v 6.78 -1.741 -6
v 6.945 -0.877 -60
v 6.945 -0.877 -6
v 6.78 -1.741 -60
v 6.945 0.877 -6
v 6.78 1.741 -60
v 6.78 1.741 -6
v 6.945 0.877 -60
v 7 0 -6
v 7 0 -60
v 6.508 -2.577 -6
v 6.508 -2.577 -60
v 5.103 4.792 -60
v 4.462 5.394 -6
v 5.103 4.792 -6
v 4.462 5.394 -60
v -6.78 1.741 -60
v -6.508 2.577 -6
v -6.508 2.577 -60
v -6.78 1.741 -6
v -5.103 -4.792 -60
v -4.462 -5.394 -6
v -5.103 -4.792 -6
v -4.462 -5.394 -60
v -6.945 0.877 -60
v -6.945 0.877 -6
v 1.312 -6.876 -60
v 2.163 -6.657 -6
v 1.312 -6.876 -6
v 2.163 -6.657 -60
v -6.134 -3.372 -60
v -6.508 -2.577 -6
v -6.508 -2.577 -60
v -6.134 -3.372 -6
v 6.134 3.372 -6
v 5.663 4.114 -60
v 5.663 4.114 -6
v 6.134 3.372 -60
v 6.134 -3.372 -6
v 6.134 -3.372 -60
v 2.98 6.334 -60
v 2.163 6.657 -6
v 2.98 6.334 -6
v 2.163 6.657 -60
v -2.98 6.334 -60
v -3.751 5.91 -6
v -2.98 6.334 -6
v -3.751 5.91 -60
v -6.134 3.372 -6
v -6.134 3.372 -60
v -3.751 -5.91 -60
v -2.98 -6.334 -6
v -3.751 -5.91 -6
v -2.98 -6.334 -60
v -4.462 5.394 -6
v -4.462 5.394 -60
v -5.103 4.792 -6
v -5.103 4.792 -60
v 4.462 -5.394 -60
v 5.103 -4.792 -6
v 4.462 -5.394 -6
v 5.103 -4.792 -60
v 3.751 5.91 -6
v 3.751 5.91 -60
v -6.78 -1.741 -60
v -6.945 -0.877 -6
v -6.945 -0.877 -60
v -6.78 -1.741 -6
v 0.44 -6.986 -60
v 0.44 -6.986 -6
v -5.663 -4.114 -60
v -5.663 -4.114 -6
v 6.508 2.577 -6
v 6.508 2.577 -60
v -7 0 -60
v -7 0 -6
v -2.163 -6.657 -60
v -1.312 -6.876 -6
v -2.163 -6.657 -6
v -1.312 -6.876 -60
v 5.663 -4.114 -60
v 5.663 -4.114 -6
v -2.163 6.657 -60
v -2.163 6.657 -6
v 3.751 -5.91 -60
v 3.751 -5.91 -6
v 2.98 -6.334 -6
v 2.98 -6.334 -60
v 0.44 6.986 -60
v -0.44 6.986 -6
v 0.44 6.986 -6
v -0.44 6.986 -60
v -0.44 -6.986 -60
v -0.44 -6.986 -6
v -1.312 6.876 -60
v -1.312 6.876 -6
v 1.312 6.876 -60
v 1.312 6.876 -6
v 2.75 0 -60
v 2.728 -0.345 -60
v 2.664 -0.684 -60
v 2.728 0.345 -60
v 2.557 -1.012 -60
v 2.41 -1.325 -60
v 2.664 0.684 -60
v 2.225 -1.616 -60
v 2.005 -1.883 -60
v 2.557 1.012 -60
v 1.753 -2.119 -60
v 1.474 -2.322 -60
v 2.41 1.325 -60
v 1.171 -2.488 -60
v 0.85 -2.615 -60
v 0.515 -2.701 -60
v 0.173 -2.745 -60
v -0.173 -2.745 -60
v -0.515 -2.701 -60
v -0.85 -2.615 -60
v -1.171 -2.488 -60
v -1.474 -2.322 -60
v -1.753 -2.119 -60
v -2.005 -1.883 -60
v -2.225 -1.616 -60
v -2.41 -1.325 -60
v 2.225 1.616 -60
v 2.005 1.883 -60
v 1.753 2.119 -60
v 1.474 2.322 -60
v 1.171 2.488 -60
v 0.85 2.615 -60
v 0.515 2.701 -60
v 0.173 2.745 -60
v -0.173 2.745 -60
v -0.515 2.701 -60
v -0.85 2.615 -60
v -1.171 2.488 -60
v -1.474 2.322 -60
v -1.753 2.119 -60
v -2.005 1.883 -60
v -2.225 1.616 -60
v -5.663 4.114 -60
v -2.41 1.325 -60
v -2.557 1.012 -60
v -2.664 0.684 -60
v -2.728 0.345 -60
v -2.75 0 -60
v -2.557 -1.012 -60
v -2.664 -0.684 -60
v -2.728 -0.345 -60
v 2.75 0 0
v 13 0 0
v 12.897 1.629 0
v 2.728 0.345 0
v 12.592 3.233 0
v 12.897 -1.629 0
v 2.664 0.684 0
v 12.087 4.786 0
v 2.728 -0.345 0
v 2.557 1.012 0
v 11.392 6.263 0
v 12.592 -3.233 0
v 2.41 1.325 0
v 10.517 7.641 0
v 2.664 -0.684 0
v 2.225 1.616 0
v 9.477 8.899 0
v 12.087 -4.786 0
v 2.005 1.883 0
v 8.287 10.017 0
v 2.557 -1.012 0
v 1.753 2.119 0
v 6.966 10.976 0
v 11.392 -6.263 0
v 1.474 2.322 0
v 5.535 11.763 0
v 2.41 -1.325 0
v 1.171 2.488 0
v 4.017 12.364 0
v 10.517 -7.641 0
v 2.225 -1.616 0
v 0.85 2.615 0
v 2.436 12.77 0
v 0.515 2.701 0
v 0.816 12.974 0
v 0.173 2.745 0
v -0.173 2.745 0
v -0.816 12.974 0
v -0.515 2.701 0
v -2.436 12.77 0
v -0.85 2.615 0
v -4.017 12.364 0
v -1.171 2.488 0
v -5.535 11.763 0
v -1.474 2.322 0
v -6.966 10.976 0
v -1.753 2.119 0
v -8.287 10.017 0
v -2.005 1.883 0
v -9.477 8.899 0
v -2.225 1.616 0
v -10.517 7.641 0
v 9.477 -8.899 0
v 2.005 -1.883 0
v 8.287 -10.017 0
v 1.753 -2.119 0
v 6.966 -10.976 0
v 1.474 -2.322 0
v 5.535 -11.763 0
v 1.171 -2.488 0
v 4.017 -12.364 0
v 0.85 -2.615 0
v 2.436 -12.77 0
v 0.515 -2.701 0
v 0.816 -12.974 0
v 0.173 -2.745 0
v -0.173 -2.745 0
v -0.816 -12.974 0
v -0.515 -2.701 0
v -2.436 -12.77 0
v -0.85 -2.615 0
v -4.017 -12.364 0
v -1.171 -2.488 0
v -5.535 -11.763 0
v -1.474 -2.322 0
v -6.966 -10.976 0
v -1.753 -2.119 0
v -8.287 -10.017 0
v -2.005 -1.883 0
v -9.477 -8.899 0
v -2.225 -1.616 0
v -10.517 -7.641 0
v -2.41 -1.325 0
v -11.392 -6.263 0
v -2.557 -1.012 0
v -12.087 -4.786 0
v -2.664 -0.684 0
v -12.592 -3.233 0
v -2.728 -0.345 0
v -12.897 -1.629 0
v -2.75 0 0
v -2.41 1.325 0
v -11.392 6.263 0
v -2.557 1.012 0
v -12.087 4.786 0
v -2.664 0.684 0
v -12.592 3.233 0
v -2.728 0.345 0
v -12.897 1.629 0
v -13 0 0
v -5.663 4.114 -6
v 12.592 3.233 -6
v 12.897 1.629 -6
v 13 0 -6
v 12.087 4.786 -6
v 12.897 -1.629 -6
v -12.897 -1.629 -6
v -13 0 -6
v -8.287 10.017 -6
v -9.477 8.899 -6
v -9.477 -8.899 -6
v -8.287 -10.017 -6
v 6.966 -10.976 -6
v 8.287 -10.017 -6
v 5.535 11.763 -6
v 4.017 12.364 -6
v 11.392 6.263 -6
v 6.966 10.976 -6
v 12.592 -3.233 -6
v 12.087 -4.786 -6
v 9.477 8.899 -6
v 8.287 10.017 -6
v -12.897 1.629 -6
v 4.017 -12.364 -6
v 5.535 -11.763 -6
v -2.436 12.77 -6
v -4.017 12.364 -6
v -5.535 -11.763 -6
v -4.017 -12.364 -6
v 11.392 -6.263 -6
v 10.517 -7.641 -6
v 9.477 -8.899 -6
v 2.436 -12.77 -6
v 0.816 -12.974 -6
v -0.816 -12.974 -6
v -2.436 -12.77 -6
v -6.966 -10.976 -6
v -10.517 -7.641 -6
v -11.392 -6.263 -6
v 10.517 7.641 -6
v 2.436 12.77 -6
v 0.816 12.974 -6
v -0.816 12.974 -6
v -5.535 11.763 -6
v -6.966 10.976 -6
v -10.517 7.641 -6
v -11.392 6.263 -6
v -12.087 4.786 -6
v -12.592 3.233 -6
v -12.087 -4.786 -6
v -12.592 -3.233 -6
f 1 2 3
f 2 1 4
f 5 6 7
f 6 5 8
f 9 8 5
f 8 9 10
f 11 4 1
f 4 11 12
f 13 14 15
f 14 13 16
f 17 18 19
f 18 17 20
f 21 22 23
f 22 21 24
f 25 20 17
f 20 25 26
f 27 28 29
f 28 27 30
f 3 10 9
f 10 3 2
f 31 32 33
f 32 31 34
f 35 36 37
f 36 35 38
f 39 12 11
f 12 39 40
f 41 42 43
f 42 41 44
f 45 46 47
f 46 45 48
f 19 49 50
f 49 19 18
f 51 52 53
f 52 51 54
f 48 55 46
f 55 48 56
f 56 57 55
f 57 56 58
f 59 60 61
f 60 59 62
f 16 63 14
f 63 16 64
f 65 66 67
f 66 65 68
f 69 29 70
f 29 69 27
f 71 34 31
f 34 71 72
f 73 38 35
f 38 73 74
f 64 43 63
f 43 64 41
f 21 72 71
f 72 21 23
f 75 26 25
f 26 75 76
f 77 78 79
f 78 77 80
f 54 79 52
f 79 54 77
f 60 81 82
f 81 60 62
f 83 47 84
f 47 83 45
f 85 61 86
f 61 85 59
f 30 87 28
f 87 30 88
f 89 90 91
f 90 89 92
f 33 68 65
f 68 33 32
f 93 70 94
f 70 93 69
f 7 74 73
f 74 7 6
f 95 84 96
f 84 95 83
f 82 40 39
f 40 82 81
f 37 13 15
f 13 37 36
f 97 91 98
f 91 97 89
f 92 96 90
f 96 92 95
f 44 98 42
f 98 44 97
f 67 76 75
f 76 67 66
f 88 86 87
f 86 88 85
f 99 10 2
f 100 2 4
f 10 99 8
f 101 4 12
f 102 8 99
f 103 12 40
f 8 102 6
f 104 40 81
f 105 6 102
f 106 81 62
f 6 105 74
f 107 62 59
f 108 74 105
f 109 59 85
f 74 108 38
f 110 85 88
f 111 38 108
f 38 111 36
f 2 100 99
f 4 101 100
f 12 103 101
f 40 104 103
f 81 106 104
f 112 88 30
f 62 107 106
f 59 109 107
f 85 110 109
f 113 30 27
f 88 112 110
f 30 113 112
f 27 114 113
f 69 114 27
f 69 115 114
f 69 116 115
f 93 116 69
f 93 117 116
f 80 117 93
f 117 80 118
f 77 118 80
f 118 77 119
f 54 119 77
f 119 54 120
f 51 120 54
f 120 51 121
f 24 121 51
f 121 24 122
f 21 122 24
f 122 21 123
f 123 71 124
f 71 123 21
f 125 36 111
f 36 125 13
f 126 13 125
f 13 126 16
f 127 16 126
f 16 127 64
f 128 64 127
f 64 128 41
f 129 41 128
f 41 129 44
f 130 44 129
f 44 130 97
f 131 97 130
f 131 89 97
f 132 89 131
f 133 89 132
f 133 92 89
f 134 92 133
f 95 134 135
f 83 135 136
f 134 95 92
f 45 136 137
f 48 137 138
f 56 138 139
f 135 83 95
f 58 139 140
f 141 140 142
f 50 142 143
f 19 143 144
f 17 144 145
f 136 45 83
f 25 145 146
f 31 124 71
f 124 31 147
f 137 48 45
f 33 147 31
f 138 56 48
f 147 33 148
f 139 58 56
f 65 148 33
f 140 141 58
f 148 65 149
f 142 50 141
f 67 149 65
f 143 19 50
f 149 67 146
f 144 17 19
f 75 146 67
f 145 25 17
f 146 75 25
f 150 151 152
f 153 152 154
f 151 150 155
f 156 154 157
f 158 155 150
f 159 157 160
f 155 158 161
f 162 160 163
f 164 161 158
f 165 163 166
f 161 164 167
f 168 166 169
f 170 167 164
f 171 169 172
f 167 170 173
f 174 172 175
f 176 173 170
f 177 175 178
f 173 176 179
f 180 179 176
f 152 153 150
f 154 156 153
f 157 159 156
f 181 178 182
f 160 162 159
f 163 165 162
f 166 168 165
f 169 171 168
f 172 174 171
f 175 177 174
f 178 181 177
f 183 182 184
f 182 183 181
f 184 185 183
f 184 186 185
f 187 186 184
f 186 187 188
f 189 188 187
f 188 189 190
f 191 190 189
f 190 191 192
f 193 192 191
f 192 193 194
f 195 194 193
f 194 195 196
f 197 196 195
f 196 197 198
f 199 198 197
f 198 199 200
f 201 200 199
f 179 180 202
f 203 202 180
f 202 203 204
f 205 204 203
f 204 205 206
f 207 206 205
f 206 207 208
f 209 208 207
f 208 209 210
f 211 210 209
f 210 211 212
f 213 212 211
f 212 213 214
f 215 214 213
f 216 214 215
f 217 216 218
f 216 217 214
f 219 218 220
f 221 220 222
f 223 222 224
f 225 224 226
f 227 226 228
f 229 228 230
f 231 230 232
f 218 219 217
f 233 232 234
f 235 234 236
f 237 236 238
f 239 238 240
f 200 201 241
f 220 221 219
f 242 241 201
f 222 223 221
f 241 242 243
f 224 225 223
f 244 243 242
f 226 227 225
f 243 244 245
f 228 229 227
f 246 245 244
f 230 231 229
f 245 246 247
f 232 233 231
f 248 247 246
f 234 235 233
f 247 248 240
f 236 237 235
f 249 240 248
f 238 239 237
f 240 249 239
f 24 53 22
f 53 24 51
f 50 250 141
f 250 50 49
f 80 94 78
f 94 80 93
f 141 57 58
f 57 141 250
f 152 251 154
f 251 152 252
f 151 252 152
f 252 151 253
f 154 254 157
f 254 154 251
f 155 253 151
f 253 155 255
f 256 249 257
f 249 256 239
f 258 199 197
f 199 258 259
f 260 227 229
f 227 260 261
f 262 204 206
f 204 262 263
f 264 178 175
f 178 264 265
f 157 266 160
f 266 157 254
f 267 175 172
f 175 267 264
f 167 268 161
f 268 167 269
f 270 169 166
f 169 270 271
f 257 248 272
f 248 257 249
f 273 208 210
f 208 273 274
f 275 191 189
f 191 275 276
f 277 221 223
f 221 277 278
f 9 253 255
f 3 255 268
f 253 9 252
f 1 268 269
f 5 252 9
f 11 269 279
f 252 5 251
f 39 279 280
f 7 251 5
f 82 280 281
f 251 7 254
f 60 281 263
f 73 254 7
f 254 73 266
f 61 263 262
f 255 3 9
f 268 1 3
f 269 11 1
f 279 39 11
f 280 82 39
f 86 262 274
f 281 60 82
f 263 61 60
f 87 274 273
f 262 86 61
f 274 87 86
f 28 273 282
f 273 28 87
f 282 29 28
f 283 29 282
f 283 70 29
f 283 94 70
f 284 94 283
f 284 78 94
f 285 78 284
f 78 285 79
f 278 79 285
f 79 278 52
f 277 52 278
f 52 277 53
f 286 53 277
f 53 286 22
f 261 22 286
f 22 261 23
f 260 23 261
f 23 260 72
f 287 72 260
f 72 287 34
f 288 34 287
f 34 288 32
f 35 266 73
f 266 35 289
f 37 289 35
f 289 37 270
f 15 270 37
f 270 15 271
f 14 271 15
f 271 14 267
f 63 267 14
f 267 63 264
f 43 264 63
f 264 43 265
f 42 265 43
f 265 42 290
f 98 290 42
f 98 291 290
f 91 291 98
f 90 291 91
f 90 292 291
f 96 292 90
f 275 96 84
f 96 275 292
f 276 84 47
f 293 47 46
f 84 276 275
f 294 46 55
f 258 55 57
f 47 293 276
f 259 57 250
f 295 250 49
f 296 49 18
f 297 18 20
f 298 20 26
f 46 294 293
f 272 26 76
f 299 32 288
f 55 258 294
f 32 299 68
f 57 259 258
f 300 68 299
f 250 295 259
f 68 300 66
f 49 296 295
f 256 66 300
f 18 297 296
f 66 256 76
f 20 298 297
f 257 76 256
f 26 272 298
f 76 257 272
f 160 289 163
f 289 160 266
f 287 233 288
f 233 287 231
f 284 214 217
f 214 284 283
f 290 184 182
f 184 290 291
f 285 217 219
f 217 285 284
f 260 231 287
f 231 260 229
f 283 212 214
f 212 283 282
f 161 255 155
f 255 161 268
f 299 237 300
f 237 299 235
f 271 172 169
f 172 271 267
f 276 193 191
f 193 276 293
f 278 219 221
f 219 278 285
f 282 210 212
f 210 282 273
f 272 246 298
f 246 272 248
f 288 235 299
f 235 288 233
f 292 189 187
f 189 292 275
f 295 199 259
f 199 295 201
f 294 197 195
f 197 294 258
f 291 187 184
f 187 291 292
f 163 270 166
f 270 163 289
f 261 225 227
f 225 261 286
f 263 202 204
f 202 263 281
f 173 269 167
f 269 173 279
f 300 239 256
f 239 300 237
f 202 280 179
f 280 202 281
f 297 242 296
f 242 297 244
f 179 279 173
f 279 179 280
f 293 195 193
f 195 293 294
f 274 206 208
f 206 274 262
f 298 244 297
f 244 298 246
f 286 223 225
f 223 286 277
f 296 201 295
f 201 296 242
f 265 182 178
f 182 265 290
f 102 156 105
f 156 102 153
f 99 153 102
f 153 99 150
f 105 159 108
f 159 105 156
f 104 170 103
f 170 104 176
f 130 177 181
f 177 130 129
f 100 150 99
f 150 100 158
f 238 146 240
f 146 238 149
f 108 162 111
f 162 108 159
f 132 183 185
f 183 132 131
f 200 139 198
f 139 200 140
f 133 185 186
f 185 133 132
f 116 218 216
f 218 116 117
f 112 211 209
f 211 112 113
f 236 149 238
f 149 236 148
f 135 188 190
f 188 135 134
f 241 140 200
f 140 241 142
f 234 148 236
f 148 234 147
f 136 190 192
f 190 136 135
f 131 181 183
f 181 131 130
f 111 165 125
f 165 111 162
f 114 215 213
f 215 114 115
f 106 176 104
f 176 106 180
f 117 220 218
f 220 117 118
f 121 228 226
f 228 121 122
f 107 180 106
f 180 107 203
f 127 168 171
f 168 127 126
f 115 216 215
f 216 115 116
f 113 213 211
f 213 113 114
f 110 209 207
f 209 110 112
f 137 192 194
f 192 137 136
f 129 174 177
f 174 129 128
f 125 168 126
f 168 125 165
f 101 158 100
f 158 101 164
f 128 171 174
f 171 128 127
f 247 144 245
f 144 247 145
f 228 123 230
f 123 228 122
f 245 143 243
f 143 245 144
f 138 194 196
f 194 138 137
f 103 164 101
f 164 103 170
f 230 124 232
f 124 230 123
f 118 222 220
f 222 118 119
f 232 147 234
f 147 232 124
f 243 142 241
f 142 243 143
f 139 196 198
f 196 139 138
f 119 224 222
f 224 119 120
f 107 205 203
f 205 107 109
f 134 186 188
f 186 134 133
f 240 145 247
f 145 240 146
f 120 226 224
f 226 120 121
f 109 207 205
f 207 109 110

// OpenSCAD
$fn = 50;


difference() {
	union() {
		translate(v = [0, 0, -60.0000000000]) {
			cylinder(h = 60, r = 7.0000000000);
		}
		translate(v = [0, 0, -6.0000000000]) {
			cylinder(h = 6, r = 13.0000000000);
		}
	}
	union() {
		#translate(v = [0, 0, -60]) {
			cylinder(h = 60, r = 2.7500000000);
		}
	}
}
